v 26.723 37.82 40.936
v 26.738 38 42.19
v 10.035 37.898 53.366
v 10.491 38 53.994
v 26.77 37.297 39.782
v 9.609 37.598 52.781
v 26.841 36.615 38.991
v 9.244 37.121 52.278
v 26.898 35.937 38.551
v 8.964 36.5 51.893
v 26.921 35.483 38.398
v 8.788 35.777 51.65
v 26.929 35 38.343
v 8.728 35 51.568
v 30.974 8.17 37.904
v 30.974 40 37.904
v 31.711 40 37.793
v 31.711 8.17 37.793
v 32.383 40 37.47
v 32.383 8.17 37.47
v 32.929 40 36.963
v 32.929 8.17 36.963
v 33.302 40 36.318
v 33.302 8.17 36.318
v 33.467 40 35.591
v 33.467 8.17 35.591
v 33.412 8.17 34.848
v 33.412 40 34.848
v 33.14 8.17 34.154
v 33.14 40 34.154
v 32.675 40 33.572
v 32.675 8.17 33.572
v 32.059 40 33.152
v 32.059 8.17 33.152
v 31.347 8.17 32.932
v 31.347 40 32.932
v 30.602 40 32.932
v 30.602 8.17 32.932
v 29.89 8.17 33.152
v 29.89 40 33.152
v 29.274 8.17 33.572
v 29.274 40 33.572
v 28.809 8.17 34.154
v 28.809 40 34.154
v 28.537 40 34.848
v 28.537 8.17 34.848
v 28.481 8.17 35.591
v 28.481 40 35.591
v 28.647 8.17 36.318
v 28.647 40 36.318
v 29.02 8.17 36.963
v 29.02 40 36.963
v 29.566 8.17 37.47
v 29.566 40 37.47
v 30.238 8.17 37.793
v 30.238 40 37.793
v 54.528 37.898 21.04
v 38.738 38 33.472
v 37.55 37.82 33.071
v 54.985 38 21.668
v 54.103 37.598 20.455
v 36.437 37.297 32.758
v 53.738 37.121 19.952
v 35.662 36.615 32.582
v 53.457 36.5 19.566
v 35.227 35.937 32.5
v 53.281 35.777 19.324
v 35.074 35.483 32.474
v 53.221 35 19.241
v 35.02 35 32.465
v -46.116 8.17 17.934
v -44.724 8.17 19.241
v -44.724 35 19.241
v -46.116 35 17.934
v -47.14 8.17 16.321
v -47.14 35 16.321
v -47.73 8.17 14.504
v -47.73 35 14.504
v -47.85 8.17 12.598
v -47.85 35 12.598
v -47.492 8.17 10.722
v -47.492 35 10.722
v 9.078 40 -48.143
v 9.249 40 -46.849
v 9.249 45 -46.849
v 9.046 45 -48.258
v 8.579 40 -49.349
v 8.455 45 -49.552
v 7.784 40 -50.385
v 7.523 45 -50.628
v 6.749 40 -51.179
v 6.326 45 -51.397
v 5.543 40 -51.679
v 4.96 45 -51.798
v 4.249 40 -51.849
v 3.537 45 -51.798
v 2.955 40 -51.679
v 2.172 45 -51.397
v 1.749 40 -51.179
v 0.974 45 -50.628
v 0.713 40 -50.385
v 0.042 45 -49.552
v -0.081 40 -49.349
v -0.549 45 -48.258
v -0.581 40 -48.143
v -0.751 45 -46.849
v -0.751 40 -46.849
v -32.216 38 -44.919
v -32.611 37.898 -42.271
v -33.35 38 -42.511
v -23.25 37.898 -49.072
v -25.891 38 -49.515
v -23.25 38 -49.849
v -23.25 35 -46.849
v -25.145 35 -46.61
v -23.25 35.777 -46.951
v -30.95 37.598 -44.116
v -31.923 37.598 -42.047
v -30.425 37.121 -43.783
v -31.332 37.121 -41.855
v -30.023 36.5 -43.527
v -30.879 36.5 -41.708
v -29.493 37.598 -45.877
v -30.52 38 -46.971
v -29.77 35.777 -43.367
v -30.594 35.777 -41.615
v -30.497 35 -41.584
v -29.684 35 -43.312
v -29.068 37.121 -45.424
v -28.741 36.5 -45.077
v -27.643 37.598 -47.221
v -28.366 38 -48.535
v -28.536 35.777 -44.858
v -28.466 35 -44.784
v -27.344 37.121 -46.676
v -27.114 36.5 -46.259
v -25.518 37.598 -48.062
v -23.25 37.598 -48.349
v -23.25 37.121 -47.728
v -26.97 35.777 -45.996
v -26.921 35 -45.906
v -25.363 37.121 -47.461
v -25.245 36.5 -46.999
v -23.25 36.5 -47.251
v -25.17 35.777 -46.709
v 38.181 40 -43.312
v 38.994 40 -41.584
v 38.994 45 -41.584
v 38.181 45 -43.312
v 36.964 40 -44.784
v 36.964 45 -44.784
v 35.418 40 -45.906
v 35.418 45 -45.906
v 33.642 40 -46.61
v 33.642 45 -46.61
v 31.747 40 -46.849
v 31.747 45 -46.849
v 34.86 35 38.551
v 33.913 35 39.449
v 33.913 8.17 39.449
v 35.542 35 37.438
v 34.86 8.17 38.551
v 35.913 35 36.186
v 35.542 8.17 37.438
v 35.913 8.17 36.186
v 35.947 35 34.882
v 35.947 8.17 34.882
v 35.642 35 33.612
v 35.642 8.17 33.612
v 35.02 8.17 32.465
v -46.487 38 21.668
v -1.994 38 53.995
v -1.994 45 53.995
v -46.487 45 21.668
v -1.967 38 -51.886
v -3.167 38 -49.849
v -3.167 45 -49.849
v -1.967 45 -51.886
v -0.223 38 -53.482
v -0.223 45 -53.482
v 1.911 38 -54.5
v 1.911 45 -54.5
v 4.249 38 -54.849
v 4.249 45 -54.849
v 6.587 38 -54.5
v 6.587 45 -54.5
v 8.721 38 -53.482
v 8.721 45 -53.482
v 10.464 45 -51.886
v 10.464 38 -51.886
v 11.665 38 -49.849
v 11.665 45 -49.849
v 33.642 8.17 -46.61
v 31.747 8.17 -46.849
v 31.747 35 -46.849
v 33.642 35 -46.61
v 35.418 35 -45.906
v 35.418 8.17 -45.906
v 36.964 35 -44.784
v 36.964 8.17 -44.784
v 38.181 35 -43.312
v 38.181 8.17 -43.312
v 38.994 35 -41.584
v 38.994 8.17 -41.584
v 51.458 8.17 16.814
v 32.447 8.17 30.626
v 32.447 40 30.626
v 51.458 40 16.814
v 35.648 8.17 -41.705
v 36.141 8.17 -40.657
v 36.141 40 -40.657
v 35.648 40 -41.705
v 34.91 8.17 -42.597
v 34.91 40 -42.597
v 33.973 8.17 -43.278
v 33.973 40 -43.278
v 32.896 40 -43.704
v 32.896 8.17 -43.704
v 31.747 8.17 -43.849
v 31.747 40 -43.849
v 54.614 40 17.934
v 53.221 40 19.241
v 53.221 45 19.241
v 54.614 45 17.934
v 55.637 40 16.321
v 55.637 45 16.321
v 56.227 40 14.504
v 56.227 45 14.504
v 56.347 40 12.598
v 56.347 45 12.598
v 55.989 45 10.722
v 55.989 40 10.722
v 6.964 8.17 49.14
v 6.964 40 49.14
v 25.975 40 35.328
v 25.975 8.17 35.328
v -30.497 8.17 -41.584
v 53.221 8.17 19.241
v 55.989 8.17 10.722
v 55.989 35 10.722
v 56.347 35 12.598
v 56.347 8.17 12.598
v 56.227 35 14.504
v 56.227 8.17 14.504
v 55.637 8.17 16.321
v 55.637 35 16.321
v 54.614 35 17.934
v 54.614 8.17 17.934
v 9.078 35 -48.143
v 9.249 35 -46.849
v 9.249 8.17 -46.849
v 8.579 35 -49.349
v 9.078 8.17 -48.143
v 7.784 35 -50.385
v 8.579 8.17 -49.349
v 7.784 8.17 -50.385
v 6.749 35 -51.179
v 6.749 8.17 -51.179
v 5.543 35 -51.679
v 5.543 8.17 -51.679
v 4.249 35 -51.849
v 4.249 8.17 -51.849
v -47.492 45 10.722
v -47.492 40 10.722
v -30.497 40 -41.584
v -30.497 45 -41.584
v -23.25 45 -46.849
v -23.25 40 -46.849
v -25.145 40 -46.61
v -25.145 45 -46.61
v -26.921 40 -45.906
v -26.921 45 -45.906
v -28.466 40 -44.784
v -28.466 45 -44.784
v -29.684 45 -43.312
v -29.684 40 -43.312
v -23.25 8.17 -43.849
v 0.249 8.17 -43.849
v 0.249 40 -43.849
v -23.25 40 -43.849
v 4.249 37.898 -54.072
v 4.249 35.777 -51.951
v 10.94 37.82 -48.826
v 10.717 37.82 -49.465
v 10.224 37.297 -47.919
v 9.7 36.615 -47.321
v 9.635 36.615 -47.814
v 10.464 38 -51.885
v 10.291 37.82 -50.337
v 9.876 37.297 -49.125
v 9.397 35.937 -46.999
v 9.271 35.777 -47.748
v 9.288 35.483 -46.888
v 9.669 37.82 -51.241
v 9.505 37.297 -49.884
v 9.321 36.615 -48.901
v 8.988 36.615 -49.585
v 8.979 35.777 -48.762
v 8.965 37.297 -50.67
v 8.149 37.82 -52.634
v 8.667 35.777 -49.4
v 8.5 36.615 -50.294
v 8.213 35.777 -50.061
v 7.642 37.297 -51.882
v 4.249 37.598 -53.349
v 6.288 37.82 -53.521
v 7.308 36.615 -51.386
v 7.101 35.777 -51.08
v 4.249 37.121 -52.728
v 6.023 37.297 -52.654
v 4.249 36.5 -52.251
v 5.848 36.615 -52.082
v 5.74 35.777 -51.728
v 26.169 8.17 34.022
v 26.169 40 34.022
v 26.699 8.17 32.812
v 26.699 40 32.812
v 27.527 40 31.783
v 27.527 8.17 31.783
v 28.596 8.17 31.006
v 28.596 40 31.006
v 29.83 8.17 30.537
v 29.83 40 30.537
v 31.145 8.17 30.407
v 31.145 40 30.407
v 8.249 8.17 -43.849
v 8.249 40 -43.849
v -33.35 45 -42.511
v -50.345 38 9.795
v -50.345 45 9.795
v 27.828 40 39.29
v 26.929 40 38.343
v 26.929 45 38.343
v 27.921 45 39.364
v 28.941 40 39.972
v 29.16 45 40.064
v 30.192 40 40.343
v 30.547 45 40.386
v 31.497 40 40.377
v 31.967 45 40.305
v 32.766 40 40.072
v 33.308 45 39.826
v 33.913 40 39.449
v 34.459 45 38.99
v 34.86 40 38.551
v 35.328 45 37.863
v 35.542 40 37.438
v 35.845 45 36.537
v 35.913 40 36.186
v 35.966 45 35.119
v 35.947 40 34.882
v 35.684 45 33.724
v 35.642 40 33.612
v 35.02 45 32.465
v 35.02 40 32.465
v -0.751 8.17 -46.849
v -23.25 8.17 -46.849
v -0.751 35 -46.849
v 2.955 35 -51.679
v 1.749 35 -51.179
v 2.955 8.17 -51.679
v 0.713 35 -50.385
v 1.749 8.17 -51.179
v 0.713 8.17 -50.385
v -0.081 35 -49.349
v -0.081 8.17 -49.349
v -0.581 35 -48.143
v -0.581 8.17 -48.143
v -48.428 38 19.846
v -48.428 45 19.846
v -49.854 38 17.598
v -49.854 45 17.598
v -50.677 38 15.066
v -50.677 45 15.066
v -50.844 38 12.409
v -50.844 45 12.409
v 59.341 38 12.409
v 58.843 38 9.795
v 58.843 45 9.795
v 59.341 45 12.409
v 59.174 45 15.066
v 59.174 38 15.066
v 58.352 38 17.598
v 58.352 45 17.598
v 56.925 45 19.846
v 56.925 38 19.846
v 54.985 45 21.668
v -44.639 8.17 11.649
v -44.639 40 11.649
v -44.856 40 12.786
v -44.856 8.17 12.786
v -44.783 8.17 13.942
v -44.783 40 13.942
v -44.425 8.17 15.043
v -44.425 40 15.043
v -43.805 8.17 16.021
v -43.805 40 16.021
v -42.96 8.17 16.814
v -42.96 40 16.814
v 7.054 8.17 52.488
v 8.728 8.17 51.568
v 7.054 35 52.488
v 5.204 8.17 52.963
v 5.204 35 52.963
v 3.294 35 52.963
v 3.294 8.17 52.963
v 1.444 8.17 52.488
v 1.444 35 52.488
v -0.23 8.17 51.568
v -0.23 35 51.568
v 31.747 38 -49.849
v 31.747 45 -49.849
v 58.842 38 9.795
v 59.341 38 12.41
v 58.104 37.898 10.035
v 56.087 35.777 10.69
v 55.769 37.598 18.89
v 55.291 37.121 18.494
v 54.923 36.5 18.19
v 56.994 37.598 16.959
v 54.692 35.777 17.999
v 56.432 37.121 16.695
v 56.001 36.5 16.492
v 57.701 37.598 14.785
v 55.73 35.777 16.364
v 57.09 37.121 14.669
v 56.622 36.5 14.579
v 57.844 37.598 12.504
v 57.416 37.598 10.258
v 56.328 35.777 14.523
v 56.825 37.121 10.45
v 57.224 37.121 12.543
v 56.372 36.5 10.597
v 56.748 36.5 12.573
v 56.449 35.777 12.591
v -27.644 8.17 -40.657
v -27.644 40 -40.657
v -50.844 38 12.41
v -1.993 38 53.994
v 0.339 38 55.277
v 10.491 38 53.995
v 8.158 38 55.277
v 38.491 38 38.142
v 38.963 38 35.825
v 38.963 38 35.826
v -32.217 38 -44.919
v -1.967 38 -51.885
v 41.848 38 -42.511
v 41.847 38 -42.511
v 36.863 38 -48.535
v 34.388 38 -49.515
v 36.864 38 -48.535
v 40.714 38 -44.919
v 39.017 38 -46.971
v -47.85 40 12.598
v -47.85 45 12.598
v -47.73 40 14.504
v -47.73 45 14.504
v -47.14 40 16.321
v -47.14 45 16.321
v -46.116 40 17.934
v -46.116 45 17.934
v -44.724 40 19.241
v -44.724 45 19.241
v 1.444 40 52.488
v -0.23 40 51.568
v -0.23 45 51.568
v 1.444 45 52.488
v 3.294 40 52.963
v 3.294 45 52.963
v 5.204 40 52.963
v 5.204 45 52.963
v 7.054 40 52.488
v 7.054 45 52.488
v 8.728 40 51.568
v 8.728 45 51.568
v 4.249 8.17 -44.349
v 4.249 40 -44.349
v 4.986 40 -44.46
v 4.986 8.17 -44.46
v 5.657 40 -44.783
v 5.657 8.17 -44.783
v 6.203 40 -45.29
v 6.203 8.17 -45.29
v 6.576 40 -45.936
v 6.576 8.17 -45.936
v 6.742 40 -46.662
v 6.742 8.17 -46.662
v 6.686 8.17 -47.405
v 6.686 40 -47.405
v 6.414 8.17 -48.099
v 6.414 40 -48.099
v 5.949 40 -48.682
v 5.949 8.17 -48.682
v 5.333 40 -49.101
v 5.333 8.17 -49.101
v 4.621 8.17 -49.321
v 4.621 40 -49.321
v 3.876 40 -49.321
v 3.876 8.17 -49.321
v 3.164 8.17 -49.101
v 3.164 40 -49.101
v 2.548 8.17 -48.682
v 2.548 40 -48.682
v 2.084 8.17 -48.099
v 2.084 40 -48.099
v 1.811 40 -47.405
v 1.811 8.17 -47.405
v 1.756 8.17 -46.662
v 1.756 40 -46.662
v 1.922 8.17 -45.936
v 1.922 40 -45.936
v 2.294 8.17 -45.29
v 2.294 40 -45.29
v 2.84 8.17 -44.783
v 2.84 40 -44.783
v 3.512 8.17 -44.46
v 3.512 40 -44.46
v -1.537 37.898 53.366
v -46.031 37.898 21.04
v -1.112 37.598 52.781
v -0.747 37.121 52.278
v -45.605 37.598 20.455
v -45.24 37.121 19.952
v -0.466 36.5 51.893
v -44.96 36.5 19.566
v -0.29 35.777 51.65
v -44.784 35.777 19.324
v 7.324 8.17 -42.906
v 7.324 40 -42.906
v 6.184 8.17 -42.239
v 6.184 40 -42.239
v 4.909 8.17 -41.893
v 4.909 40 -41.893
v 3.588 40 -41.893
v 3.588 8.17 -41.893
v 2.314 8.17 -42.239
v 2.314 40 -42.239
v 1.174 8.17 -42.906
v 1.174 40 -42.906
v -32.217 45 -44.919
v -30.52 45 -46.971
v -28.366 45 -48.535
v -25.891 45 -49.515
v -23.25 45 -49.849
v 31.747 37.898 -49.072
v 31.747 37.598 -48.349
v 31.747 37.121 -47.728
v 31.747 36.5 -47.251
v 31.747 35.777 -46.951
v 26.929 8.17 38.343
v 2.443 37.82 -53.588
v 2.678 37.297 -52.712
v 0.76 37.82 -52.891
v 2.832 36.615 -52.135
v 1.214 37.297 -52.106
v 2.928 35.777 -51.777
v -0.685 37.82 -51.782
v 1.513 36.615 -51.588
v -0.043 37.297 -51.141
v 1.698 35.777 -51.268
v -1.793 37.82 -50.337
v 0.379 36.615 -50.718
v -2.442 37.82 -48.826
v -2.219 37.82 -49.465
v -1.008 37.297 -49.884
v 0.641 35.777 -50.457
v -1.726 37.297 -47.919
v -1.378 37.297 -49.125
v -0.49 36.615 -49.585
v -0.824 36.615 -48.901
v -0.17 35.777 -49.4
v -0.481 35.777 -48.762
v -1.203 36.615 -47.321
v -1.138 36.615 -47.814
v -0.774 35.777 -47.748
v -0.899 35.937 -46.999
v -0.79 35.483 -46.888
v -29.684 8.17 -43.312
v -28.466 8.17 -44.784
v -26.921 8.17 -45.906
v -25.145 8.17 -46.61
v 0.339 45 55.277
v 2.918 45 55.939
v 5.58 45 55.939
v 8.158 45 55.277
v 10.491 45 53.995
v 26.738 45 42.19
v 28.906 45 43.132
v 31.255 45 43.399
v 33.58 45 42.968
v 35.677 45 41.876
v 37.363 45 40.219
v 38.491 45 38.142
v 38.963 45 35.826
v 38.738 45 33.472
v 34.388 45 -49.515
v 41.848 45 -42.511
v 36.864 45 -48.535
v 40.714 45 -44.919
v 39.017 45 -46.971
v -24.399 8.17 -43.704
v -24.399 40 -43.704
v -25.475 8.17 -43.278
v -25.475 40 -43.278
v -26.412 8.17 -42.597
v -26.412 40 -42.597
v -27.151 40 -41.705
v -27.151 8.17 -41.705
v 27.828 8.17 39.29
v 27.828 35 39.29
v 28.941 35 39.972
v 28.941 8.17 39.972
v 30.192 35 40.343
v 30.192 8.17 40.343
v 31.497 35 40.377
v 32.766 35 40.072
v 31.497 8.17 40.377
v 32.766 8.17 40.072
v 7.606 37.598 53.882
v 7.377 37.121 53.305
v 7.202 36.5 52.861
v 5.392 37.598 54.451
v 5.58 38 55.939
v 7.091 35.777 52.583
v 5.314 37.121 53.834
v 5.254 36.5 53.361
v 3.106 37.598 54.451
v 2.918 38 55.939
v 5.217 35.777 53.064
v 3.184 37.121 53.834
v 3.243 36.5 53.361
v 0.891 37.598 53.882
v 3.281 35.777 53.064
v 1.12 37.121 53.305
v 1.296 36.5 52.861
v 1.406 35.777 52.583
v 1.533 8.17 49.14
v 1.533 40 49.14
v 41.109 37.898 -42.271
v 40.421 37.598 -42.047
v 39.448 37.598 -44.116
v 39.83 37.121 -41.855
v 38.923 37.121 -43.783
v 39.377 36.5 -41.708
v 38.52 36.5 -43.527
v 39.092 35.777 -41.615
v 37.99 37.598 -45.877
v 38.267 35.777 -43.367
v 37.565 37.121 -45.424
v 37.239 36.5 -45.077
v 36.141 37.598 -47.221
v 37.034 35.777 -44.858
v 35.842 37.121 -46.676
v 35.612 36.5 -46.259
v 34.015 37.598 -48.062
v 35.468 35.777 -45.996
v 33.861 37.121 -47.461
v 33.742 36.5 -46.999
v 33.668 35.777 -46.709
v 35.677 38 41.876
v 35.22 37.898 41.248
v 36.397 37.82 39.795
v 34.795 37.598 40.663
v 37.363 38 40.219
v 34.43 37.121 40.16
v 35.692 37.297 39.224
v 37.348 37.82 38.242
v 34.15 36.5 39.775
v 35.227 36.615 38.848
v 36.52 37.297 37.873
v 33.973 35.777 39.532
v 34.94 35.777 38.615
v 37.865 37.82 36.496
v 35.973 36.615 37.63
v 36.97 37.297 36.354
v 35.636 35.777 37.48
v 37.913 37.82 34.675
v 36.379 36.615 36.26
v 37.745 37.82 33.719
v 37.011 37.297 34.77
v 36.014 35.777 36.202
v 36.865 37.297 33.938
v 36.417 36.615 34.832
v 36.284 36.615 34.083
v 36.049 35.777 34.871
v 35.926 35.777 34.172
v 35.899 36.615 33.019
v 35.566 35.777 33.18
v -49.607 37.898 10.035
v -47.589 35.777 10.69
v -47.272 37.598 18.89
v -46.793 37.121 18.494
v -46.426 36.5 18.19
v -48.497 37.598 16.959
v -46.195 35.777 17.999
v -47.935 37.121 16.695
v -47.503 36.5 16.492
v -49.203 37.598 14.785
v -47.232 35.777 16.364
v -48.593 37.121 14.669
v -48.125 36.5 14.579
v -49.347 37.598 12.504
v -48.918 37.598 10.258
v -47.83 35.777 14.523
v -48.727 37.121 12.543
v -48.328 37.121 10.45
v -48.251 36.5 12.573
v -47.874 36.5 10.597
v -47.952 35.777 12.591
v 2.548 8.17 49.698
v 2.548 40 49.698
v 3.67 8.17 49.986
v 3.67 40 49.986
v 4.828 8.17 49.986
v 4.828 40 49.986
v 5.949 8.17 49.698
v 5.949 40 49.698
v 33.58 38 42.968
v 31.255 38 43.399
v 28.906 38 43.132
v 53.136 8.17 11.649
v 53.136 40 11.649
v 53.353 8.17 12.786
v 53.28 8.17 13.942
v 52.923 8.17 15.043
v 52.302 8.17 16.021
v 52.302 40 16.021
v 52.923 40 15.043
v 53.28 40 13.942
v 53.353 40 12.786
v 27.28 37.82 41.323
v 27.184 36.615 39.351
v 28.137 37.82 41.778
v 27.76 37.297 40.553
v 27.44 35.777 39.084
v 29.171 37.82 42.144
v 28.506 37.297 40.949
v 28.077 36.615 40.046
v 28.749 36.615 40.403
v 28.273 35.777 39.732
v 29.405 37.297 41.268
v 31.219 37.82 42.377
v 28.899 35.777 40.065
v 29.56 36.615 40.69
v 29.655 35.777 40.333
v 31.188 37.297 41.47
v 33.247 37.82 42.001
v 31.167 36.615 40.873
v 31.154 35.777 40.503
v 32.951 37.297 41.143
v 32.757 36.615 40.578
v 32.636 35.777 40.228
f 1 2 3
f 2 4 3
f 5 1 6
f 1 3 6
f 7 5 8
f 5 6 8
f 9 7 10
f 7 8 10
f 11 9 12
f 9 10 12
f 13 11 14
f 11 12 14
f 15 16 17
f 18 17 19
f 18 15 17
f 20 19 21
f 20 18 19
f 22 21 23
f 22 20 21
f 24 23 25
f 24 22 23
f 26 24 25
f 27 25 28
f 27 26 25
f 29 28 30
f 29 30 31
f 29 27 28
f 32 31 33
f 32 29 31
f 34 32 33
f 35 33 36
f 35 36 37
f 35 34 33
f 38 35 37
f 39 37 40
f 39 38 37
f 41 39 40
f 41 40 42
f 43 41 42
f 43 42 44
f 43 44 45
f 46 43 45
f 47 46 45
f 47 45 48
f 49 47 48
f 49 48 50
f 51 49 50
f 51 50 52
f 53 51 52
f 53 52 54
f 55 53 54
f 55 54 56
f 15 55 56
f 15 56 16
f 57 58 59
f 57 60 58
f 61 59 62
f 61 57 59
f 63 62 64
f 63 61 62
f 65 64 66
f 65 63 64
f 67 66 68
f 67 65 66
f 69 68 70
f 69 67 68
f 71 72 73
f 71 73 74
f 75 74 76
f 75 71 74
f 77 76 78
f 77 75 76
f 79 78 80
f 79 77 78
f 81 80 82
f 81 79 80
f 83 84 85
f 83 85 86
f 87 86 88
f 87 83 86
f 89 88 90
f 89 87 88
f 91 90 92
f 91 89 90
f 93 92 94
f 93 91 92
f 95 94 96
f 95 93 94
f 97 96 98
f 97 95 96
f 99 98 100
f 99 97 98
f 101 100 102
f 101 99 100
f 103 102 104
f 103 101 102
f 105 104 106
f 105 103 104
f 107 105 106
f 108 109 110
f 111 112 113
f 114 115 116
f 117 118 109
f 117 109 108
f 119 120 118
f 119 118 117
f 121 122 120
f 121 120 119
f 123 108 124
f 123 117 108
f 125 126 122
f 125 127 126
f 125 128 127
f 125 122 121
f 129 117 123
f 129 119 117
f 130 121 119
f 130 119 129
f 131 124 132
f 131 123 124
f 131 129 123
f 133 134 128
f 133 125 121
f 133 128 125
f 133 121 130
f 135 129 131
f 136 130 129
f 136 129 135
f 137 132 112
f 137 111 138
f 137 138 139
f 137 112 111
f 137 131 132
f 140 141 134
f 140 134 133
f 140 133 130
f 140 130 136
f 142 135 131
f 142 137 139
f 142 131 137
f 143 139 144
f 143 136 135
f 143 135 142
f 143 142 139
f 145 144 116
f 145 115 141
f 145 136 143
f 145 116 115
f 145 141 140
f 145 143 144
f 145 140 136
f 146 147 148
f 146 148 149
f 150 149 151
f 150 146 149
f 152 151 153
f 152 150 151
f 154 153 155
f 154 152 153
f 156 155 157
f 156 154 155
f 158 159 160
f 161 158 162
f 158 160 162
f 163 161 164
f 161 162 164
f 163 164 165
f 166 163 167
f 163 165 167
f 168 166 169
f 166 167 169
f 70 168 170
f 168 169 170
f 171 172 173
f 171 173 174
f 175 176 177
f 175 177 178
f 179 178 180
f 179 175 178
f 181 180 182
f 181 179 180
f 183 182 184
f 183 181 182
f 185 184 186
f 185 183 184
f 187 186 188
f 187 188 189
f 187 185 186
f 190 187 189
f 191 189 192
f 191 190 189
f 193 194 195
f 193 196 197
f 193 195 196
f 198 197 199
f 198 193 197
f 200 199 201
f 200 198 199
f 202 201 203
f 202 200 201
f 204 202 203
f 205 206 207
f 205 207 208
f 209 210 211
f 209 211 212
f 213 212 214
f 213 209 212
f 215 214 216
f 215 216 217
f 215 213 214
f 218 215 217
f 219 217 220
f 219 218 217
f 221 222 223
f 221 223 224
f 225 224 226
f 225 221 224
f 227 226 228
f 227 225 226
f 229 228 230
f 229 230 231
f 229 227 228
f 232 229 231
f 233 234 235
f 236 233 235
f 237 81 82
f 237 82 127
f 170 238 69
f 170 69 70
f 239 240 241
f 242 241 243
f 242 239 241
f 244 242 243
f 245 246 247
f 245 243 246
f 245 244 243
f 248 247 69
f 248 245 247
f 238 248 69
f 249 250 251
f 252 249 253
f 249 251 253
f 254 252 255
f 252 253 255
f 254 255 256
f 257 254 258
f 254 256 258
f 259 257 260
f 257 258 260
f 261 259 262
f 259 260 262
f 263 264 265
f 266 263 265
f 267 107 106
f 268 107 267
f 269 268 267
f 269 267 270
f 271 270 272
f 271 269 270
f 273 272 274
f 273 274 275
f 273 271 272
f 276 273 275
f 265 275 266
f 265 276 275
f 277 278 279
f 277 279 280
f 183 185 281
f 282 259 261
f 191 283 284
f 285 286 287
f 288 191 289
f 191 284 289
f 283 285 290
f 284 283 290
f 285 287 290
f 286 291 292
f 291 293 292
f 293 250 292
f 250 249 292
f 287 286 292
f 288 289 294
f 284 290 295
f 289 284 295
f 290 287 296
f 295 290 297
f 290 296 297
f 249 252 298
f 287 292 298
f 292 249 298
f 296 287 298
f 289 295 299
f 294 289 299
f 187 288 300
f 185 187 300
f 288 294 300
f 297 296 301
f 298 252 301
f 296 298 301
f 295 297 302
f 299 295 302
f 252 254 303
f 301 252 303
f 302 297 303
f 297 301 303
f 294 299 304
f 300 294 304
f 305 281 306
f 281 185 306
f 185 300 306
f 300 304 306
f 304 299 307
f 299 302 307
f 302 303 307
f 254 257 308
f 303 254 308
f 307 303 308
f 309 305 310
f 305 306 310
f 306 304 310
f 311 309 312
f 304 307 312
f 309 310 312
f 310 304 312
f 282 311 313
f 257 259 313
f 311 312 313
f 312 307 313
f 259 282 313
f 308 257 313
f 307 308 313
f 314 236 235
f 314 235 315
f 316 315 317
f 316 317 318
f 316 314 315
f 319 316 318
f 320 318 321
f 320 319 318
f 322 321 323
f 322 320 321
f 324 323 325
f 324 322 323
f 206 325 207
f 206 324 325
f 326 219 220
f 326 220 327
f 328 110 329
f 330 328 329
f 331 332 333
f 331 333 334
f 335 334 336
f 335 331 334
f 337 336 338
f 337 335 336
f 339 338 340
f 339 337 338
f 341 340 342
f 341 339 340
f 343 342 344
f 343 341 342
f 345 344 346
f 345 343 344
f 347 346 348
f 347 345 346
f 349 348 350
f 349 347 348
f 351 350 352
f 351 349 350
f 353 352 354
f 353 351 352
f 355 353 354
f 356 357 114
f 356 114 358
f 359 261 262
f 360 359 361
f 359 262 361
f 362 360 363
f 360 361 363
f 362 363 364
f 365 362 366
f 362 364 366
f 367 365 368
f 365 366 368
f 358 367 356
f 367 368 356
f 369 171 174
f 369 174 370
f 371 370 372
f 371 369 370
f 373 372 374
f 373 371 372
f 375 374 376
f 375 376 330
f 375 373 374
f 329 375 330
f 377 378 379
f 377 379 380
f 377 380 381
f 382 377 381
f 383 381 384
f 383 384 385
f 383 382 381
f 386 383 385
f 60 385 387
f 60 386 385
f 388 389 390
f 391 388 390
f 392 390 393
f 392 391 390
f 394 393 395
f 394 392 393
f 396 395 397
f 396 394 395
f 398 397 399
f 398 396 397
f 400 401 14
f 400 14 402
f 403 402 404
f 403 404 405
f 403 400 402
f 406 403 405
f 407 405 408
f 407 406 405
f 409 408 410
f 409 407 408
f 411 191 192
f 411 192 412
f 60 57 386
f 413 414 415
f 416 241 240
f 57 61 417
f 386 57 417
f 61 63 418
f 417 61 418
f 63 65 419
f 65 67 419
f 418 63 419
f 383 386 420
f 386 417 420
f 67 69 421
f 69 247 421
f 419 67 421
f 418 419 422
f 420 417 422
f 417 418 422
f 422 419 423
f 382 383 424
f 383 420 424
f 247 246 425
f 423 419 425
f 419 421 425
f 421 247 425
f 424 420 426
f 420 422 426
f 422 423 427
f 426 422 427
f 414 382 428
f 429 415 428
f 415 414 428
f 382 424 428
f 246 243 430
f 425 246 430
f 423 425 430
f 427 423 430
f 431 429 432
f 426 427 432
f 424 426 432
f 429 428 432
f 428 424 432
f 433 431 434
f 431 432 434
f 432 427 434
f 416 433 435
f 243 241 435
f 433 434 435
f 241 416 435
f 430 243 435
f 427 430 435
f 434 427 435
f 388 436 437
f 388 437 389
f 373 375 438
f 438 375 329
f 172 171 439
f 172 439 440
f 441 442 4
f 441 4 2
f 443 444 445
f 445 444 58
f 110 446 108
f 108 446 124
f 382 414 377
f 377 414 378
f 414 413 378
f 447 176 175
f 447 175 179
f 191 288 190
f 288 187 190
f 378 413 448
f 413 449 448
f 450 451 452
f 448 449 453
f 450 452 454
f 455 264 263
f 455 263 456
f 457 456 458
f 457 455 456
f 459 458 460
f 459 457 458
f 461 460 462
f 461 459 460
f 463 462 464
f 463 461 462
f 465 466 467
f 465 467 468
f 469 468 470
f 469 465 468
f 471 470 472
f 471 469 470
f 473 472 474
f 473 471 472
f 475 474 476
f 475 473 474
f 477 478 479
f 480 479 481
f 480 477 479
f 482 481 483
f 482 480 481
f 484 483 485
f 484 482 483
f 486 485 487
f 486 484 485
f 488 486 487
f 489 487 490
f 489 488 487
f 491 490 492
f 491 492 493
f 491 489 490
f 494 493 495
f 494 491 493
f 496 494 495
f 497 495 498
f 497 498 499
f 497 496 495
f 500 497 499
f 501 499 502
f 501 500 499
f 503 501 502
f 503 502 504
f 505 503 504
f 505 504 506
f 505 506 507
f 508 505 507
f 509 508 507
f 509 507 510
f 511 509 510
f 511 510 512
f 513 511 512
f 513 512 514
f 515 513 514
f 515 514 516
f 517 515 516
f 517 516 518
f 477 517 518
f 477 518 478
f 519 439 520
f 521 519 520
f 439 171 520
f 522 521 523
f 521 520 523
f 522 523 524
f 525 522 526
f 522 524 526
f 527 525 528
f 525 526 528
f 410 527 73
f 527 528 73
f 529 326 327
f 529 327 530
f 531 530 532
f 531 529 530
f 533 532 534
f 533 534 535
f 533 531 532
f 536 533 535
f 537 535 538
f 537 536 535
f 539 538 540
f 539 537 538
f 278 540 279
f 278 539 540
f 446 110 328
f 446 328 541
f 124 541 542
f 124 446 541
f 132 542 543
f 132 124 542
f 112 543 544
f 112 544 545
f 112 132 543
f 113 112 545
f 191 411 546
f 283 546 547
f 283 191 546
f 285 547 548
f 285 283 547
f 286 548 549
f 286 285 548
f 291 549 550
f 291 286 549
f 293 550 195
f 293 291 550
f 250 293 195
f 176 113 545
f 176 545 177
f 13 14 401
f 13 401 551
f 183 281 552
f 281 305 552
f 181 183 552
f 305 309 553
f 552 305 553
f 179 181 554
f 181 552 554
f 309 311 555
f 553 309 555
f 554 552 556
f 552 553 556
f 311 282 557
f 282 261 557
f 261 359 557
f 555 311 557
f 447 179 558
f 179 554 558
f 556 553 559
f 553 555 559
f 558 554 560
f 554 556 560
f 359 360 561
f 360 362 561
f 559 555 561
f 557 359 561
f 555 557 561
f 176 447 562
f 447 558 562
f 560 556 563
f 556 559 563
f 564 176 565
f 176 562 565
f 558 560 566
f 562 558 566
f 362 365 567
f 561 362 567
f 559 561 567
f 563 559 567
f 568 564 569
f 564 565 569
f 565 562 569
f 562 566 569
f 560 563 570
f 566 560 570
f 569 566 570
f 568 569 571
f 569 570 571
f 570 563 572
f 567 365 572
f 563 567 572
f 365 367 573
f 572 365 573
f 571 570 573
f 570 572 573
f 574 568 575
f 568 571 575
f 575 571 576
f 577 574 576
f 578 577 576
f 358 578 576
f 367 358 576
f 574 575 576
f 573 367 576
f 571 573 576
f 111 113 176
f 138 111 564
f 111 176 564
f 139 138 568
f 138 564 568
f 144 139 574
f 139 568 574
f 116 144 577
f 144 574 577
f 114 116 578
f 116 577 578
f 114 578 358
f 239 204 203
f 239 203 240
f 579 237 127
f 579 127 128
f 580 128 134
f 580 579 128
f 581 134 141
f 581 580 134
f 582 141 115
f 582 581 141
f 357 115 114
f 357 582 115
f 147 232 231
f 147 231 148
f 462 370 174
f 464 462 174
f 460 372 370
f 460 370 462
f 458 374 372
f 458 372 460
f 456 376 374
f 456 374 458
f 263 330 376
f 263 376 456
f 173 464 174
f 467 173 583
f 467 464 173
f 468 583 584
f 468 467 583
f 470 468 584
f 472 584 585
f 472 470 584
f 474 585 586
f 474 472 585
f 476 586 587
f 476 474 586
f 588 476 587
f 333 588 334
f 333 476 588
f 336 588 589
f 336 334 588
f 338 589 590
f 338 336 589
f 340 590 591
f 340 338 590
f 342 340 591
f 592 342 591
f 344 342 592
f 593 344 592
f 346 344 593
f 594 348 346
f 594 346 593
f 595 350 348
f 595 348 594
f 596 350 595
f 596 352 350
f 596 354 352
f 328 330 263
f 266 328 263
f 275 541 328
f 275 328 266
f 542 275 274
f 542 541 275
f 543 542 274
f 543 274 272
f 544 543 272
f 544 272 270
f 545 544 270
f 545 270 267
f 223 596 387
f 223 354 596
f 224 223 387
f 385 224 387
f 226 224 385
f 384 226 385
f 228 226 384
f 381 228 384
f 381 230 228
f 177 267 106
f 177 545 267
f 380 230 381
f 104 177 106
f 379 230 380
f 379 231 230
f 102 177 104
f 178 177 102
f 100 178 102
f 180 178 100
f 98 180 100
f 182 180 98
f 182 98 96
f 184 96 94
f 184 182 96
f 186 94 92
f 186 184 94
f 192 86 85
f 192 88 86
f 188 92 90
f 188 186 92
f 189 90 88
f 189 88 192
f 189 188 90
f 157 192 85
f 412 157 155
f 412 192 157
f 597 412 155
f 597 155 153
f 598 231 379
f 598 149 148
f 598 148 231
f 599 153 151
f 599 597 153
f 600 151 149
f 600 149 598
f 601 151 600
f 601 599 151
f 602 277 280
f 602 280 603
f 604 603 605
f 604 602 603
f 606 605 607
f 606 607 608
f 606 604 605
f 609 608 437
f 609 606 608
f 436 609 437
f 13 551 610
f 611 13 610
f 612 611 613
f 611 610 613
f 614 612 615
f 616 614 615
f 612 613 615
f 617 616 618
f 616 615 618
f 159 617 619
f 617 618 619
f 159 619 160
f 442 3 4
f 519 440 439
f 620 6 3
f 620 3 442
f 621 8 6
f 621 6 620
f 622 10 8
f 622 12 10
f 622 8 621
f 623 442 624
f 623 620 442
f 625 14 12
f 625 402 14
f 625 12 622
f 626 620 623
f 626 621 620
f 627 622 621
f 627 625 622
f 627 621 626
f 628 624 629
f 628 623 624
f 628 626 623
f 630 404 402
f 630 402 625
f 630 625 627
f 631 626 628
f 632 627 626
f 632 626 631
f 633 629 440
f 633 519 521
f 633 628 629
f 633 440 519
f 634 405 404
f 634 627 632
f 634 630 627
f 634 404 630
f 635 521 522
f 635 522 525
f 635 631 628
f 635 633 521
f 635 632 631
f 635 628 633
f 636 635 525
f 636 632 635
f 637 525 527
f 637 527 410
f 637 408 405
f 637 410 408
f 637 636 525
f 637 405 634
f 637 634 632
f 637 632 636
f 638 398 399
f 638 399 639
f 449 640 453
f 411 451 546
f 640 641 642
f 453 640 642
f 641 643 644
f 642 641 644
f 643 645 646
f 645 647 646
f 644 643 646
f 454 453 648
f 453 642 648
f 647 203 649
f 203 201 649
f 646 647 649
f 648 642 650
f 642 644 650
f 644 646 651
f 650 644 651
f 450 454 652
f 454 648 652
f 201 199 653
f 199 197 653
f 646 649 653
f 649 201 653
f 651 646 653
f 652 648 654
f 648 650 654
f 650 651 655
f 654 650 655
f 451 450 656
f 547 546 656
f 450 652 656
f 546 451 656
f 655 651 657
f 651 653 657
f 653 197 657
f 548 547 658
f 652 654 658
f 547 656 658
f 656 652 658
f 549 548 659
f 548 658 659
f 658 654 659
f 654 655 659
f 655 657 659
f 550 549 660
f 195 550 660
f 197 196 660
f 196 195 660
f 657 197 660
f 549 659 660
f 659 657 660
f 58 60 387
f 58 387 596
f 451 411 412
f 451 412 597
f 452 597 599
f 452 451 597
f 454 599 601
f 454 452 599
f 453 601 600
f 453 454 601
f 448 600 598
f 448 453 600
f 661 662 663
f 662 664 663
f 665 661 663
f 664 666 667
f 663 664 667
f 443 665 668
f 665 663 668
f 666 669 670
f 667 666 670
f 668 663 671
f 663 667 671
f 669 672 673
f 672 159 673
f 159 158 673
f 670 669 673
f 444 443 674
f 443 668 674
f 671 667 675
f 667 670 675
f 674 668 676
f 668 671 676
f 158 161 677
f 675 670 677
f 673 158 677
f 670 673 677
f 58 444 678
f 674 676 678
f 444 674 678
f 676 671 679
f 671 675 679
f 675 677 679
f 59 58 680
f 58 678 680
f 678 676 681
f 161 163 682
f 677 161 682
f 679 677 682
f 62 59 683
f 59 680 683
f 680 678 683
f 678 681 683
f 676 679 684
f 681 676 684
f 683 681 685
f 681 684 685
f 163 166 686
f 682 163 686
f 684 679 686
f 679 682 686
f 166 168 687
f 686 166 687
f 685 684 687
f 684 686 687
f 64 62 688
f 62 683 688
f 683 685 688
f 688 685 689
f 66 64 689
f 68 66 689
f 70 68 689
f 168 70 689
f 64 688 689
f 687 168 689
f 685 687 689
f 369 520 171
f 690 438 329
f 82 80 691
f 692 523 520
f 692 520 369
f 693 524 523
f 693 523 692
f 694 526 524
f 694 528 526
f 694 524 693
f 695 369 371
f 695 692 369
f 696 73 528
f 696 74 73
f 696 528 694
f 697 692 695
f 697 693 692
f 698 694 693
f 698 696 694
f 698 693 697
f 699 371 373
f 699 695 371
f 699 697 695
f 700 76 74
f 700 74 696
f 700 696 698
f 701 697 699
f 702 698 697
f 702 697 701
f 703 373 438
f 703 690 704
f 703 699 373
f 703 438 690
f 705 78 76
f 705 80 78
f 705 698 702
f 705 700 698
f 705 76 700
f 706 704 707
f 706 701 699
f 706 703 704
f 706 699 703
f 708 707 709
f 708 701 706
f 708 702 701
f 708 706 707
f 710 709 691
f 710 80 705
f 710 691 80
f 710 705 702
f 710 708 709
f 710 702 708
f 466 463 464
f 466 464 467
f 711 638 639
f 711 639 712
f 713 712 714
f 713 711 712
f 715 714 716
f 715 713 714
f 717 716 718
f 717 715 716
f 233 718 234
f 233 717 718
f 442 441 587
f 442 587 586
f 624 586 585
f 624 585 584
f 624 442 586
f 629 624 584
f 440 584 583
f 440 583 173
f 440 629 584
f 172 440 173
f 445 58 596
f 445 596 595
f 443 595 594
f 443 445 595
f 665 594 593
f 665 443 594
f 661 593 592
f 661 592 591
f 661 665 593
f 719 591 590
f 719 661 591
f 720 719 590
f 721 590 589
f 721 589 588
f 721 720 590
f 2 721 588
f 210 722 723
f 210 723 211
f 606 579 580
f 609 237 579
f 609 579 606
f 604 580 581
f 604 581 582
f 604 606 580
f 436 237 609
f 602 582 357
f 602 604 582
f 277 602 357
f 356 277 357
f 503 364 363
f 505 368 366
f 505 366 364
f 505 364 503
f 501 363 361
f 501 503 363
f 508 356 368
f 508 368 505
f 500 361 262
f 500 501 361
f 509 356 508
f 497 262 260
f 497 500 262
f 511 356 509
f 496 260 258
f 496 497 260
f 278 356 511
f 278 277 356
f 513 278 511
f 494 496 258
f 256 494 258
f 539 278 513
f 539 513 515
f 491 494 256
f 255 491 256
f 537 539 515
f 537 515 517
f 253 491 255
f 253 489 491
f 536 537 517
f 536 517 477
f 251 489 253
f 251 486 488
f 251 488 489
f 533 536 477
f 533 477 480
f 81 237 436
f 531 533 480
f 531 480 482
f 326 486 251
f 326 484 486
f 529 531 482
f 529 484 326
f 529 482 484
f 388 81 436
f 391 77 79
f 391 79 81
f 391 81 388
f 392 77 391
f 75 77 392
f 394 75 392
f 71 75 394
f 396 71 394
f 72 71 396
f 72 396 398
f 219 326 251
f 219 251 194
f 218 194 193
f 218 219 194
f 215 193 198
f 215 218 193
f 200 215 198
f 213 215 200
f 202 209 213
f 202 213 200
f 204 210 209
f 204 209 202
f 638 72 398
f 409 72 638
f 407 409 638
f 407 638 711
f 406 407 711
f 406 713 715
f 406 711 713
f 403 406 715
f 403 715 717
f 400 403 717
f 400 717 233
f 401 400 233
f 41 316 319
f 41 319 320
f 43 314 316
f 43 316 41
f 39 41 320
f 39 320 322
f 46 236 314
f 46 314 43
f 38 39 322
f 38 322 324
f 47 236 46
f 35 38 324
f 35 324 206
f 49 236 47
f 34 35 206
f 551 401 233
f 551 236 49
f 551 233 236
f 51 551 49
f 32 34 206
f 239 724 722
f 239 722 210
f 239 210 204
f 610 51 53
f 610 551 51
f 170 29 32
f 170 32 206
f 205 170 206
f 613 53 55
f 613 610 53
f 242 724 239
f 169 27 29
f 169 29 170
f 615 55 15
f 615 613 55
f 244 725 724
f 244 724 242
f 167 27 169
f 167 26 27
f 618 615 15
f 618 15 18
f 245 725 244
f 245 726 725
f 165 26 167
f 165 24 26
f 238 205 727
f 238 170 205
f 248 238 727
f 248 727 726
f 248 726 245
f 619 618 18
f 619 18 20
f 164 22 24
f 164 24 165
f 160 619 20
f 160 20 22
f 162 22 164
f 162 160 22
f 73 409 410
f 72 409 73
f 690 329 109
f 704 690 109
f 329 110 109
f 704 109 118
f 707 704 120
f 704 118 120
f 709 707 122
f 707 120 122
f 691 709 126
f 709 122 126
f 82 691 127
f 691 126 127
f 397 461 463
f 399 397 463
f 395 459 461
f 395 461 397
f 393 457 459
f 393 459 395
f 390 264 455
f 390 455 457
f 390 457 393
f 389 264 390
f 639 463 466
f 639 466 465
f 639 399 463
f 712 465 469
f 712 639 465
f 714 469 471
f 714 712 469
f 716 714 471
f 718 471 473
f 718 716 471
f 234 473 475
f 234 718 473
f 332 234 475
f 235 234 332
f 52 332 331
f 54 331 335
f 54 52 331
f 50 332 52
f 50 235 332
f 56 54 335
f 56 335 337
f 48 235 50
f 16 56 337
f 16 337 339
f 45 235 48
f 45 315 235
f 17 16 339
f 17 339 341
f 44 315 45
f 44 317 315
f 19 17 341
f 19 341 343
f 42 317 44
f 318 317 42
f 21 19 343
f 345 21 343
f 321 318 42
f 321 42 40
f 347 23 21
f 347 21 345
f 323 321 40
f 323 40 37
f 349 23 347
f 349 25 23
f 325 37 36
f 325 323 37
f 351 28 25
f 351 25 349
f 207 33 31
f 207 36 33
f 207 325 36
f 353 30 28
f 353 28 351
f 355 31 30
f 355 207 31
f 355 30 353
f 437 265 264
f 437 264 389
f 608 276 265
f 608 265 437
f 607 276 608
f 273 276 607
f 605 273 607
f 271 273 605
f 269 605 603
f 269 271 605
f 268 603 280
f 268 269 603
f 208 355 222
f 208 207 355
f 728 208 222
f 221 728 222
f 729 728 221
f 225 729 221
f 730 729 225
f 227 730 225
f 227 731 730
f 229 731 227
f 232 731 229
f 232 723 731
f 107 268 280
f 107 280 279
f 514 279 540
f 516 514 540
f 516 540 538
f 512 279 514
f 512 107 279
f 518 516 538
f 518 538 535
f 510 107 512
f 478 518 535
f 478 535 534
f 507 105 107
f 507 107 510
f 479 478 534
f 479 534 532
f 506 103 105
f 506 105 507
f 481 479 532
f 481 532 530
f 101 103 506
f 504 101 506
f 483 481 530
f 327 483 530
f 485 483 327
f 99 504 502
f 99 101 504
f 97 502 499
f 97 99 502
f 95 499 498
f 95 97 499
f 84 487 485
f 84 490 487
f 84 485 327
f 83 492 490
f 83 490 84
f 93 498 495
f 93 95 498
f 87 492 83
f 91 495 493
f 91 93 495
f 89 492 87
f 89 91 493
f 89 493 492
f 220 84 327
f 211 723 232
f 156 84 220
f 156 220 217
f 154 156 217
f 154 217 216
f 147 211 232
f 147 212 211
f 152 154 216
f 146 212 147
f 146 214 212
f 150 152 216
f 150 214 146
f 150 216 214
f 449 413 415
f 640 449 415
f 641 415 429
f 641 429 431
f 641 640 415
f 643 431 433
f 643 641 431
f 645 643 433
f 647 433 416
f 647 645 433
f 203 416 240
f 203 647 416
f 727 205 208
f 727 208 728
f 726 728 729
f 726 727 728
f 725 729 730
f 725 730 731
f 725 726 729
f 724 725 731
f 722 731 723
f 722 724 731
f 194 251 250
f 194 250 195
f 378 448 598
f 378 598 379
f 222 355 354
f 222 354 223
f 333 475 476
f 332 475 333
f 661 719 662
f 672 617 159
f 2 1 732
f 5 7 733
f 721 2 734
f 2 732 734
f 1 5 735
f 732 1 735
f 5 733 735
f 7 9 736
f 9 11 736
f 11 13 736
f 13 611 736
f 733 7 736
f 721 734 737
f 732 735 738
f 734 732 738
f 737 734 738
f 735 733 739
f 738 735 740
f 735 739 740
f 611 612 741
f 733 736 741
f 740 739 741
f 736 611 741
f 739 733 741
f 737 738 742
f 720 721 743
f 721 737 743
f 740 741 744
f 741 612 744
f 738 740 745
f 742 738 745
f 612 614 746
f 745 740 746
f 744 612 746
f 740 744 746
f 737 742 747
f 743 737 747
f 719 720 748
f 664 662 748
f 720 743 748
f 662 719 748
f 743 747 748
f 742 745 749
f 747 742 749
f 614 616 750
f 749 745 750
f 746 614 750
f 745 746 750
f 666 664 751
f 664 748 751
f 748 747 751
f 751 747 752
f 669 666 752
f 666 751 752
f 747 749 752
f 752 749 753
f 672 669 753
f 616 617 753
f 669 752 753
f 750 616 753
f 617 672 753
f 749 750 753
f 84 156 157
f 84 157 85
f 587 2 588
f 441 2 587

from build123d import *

# Parameters (mm, degrees)
SKETCH1_R                = 2.5
BOSS_EXTRUDE1_DEPTH      = 40
BOSS_EXTRUDE2_DEPTH      = 5
BOSS_EXTRUDE2_DEPTH_BACK = 2
FILLET1_R                = 3
BOSS_EXTRUDE3_START      = 7
SKETCH3_R                = 2.5
BOSS_EXTRUDE3_DEPTH      = 7
SKETCH4_R                = 2.5
CUT_EXTRUDE1_DEPTH       = 15.17


with BuildPart() as part:
    # Sketch1 → Boss-Extrude1 (new body)
    # profile 1 of 3: a face of its own
    with BuildSketch(Plane(origin=(0, 0, 0), x_dir=(1, 0, 0), z_dir=(0, 1, 0))):
        with BuildLine():
            Line((55.989380272, -10.721623107), (38.994348201, 41.58370731))
            ThreePointArc((38.994348201, 41.58370731), (36.22622117, 45.39370731), (31.747297547, 46.848997812))
            Line((31.747297547, 46.848997812), (9.248758018, 46.848997812))
            ThreePointArc((9.248758018, 46.848997812), (7.784291924, 50.384531718), (4.248758018, 51.848997812))
            Line((4.248758018, 51.848997812), (4.248758018, 50.848997812))
            ThreePointArc((4.248758018, 50.848997812), (1.420330893, 49.677424937), (0.248758018, 46.848997812))
            Line((0.248758018, 46.848997812), (-23.249781512, 46.848997812))
            ThreePointArc((-23.249781512, 46.848997812), (-27.728705135, 45.39370731), (-30.496832166, 41.58370731))
            Line((-30.496832166, 41.58370731), (-47.491864237, -10.721623107))
            ThreePointArc((-47.491864237, -10.721623107), (-47.491864237, -15.431042101), (-44.723737205, -19.241042101))
            Line((-44.723737205, -19.241042101), (-0.230165605, -51.567514092))
            ThreePointArc((-0.230165605, -51.567514092), (4.248758018, -53.022804594), (8.72768164, -51.567514092))
            Line((8.72768164, -51.567514092), (27.738399463, -37.755419106))
            ThreePointArc((27.738399463, -37.755419106), (30.34872958, -39.355031459), (33.325608449, -38.640346074))
            Line((33.325608449, -38.640346074), (33.913393702, -39.449363068))
            ThreePointArc((33.913393702, -39.449363068), (35.912909143, -36.186450422), (35.019552412, -32.465351835))
            Line((35.019552412, -32.465351835), (53.22125324, -19.241042101))
            ThreePointArc((53.22125324, -19.241042101), (55.989380272, -15.431042101), (55.989380272, -10.721623107))
        make_face()
        with Locations(Location((4.248758018, 46.848997812, 0), (0, 0, 270))):
            Circle(SKETCH1_R, mode=Mode.SUBTRACT)
        with Locations(Location((30.97446744, -35.404278096, 0), (0, 0, 270))):
            Circle(SKETCH1_R, mode=Mode.SUBTRACT)
        with BuildLine():
            ThreePointArc((-23.249781512, 43.848997812), (-25.965349378, 42.966656326), (-27.643662617, 40.656656326))
            Line((-27.643662617, 40.656656326), (-44.638694688, -11.64867409))
            ThreePointArc((-44.638694688, -11.64867409), (-44.638694688, -14.503991118), (-42.960381448, -16.813991118))
            Line((-42.960381448, -16.813991118), (1.533190152, -49.140463108))
            ThreePointArc((1.533190152, -49.140463108), (4.248758018, -50.022804594), (6.964325883, -49.140463108))
            Line((6.964325883, -49.140463108), (25.975043706, -35.328368122))
            ThreePointArc((25.975043706, -35.328368122), (28.035541179, -31.359193125), (32.447179661, -30.626086104))
            Line((32.447179661, -30.626086104), (51.457897483, -16.813991118))
            ThreePointArc((51.457897483, -16.813991118), (53.136210723, -14.503991118), (53.136210723, -11.64867409))
            Line((53.136210723, -11.64867409), (36.141178653, 40.656656326))
            ThreePointArc((36.141178653, 40.656656326), (34.462865413, 42.966656326), (31.747297547, 43.848997812))
            Line((31.747297547, 43.848997812), (8.248758018, 43.848997812))
            ThreePointArc((8.248758018, 43.848997812), (4.248758018, 41.848997812), (0.248758018, 43.848997812))
            Line((0.248758018, 43.848997812), (-23.249781512, 43.848997812))
        make_face(mode=Mode.SUBTRACT)
    # profile 2 of 3: a face of its own
    with BuildSketch(Plane(origin=(0, 0, 0), x_dir=(1, 0, 0), z_dir=(0, 1, 0))):
        with BuildLine():
            ThreePointArc((26.929382468, -38.343204358), (30.192295115, -40.342719799), (33.913393702, -39.449363068))
            Line((33.913393702, -39.449363068), (33.325608449, -38.640346074))
            ThreePointArc((33.325608449, -38.640346074), (30.34872958, -39.355031459), (27.738399463, -37.755419106))
            Line((27.738399463, -37.755419106), (26.929382468, -38.343204358))
        make_face()
    # profile 3 of 3: a face of its own
    with BuildSketch(Plane(origin=(0, 0, 0), x_dir=(1, 0, 0), z_dir=(0, 1, 0))):
        with BuildLine():
            Line((4.248758018, 50.848997812), (4.248758018, 51.848997812))
            ThreePointArc((4.248758018, 51.848997812), (0.713224112, 50.384531718), (-0.751241982, 46.848997812))
            Line((-0.751241982, 46.848997812), (0.248758018, 46.848997812))
            ThreePointArc((0.248758018, 46.848997812), (1.420330893, 49.677424937), (4.248758018, 50.848997812))
        make_face()
    extrude(amount=BOSS_EXTRUDE1_DEPTH)

    # Sketch2 → Boss-Extrude2 (add, two sides: drawn at the far end of the back side and taken through both)
    with BuildSketch(Plane(origin=(0, 40, 0), x_dir=(1, 0, 0), z_dir=(0, 1, 0)).offset(-BOSS_EXTRUDE2_DEPTH_BACK)):
        Polygon((-30.496832166, 41.58370731), (-33.350001715, 42.510758293), (-50.345033785, -9.794572124), (-47.491864237, -10.721623107), align=None)
        with BuildLine():
            Line((-1.993521362, -53.994565075), (-46.487092962, -21.668093084))
            ThreePointArc((-46.487092962, -21.668093084), (-50.345033785, -16.358093084), (-50.345033785, -9.794572124))
            Line((-50.345033785, -9.794572124), (-47.491864237, -10.721623107))
            ThreePointArc((-47.491864237, -10.721623107), (-47.491864237, -15.431042101), (-44.723737205, -19.241042101))
            Line((-44.723737205, -19.241042101), (-0.230165605, -51.567514092))
            ThreePointArc((-0.230165605, -51.567514092), (4.248758018, -53.022804594), (8.72768164, -51.567514092))
            Line((8.72768164, -51.567514092), (26.929382468, -38.343204358))
            ThreePointArc((26.929382468, -38.343204358), (33.913393702, -39.449363068), (35.019552412, -32.465351835))
            Line((35.019552412, -32.465351835), (53.22125324, -19.241042101))
            ThreePointArc((53.22125324, -19.241042101), (55.989380272, -15.431042101), (55.989380272, -10.721623107))
            Line((55.989380272, -10.721623107), (38.994348201, 41.58370731))
            ThreePointArc((38.994348201, 41.58370731), (36.22622117, 45.39370731), (31.747297547, 46.848997812))
            Line((31.747297547, 46.848997812), (9.248758018, 46.848997812))
            ThreePointArc((9.248758018, 46.848997812), (4.248758018, 51.848997812), (-0.751241982, 46.848997812))
            Line((-0.751241982, 46.848997812), (-23.249781512, 46.848997812))
            Line((-23.249781512, 46.848997812), (-23.249781512, 49.848997812))
            Line((-23.249781512, 49.848997812), (-3.16744047, 49.848997812))
            ThreePointArc((-3.16744047, 49.848997812), (4.248758018, 54.848997812), (11.664956505, 49.848997812))
            Line((11.664956505, 49.848997812), (31.747297547, 49.848997812))
            ThreePointArc((31.747297547, 49.848997812), (37.989576927, 47.820758293), (41.84751775, 42.510758293))
            Line((41.84751775, 42.510758293), (58.842549821, -9.794572124))
            ThreePointArc((58.842549821, -9.794572124), (58.842549821, -16.358093084), (54.984608997, -21.668093084))
            Line((54.984608997, -21.668093084), (38.737653807, -33.472196981))
            ThreePointArc((38.737653807, -33.472196981), (35.676749458, -41.876414051), (26.737992587, -42.190461178))
            Line((26.737992587, -42.190461178), (10.491037397, -53.994565075))
            ThreePointArc((10.491037397, -53.994565075), (4.248758018, -56.022804594), (-1.993521362, -53.994565075))
        make_face()
        with BuildLine():
            ThreePointArc((-33.350001715, 42.510758293), (-29.492060891, 47.820758293), (-23.249781512, 49.848997812))
            Line((-23.249781512, 49.848997812), (-23.249781512, 46.848997812))
            ThreePointArc((-23.249781512, 46.848997812), (-27.728705135, 45.39370731), (-30.496832166, 41.58370731))
            Line((-30.496832166, 41.58370731), (-33.350001715, 42.510758293))
        make_face()
    extrude(amount=BOSS_EXTRUDE2_DEPTH + BOSS_EXTRUDE2_DEPTH_BACK)

    # Fillet1
    fillet1_edges = [part.edges().sort_by_distance(p)[0] for p in [
        (-38.994348201, 38, -15.431042101),
        (-47.491864237, 38, 15.431042101),
        (-22.476951405, 38, 35.404278096),
        (4.248758018, 38, 53.022804594),
        (17.828532054, 38, 44.955359225),
        (33.913393702, 38, 39.449363068),
        (44.120402826, 38, 25.853196968),
        (55.989380272, 38, 15.431042101),
        (47.491864237, 38, -15.431042101),
        (36.22622117, 38, -45.39370731),
        (20.498027782, 38, -46.848997812),
        (4.248758018, 38, -51.848997812),
        (-12.000511747, 38, -46.848997812),
        (-27.728705135, 38, -45.39370731),
    ]]
    fillet(fillet1_edges, radius=FILLET1_R - 0.0001)  # a hair under: the kernel refuses the full size

    # Sketch3 → Boss-Extrude3 (add)
    with BuildSketch(Plane.XZ.offset(BOSS_EXTRUDE3_START)):
        with BuildLine():
            Line((38.994348201, -41.58370731), (55.989380272, 10.721623107))
            ThreePointArc((55.989380272, 10.721623107), (55.989380272, 15.431042101), (53.22125324, 19.241042101))
            Line((53.22125324, 19.241042101), (35.019552412, 32.465351835))
            ThreePointArc((35.019552412, 32.465351835), (33.913393702, 39.449363068), (26.929382468, 38.343204358))
            Line((26.929382468, 38.343204358), (8.72768164, 51.567514092))
            ThreePointArc((8.72768164, 51.567514092), (4.248758018, 53.022804594), (-0.230165605, 51.567514092))
            Line((-0.230165605, 51.567514092), (-44.723737205, 19.241042101))
            ThreePointArc((-44.723737205, 19.241042101), (-47.491864237, 15.431042101), (-47.491864237, 10.721623107))
            Line((-47.491864237, 10.721623107), (-30.496832166, -41.58370731))
            ThreePointArc((-30.496832166, -41.58370731), (-27.728705135, -45.39370731), (-23.249781512, -46.848997812))
            Line((-23.249781512, -46.848997812), (-0.751241982, -46.848997812))
            ThreePointArc((-0.751241982, -46.848997812), (4.248758018, -51.848997812), (9.248758018, -46.848997812))
            Line((9.248758018, -46.848997812), (31.747297547, -46.848997812))
            ThreePointArc((31.747297547, -46.848997812), (36.22622117, -45.39370731), (38.994348201, -41.58370731))
        make_face()
        with Locations(Location((30.97446744, 35.404278096, 0), (0, 0, 270))):
            Circle(SKETCH3_R, mode=Mode.SUBTRACT)
        with Locations(Location((4.248758018, -46.848997812, 0), (0, 0, 270))):
            Circle(SKETCH3_R, mode=Mode.SUBTRACT)
        with BuildLine():
            Line((-44.638694688, 11.64867409), (-27.643662617, -40.656656326))
            ThreePointArc((-27.643662617, -40.656656326), (-25.965349378, -42.966656326), (-23.249781512, -43.848997812))
            Line((-23.249781512, -43.848997812), (0.248758018, -43.848997812))
            ThreePointArc((0.248758018, -43.848997812), (4.248758018, -41.848997812), (8.248758018, -43.848997812))
            Line((8.248758018, -43.848997812), (31.747297547, -43.848997812))
            ThreePointArc((31.747297547, -43.848997812), (34.462865413, -42.966656326), (36.141178653, -40.656656326))
            Line((36.141178653, -40.656656326), (53.136210723, 11.64867409))
            ThreePointArc((53.136210723, 11.64867409), (53.136210723, 14.503991118), (51.457897483, 16.813991118))
            Line((51.457897483, 16.813991118), (32.447179661, 30.626086104))
            ThreePointArc((32.447179661, 30.626086104), (28.035541179, 31.359193125), (25.975043706, 35.328368122))
            Line((25.975043706, 35.328368122), (6.964325883, 49.140463108))
            ThreePointArc((6.964325883, 49.140463108), (4.248758018, 50.022804594), (1.533190152, 49.140463108))
            Line((1.533190152, 49.140463108), (-42.960381448, 16.813991118))
            ThreePointArc((-42.960381448, 16.813991118), (-44.638694688, 14.503991118), (-44.638694688, 11.64867409))
        make_face(mode=Mode.SUBTRACT)
    extrude(amount=-BOSS_EXTRUDE3_DEPTH)

    # Sketch4 → Cut-Extrude1 (cut)
    with BuildSketch(Plane.XZ.offset(7)):
        with BuildLine():
            Line((38.994348201, -41.58370731), (55.989380272, 10.721623107))
            ThreePointArc((55.989380272, 10.721623107), (55.989380272, 15.431042101), (53.22125324, 19.241042101))
            Line((53.22125324, 19.241042101), (35.019552412, 32.465351835))
            ThreePointArc((35.019552412, 32.465351835), (33.913393702, 39.449363068), (26.929382468, 38.343204358))
            Line((26.929382468, 38.343204358), (8.72768164, 51.567514092))
            ThreePointArc((8.72768164, 51.567514092), (4.248758018, 53.022804594), (-0.230165605, 51.567514092))
            Line((-0.230165605, 51.567514092), (-44.723737205, 19.241042101))
            ThreePointArc((-44.723737205, 19.241042101), (-47.491864237, 15.431042101), (-47.491864237, 10.721623107))
            Line((-47.491864237, 10.721623107), (-30.496832166, -41.58370731))
            ThreePointArc((-30.496832166, -41.58370731), (-27.728705135, -45.39370731), (-23.249781512, -46.848997812))
            Line((-23.249781512, -46.848997812), (-0.751241982, -46.848997812))
            ThreePointArc((-0.751241982, -46.848997812), (4.248758018, -51.848997812), (9.248758018, -46.848997812))
            Line((9.248758018, -46.848997812), (31.747297547, -46.848997812))
            ThreePointArc((31.747297547, -46.848997812), (36.22622117, -45.39370731), (38.994348201, -41.58370731))
        make_face()
        with Locations(Location((30.97446744, 35.404278096, 0), (0, 0, 270))):
            Circle(SKETCH4_R, mode=Mode.SUBTRACT)
        with Locations(Location((4.248758018, -46.848997812, 0), (0, 0, 270))):
            Circle(SKETCH4_R, mode=Mode.SUBTRACT)
        with BuildLine():
            Line((-23.249781512, -43.848997812), (0.248758018, -43.848997812))
            ThreePointArc((0.248758018, -43.848997812), (4.248758018, -41.848997812), (8.248758018, -43.848997812))
            Line((8.248758018, -43.848997812), (31.747297547, -43.848997812))
            ThreePointArc((31.747297547, -43.848997812), (34.462865413, -42.966656326), (36.141178653, -40.656656326))
            Line((36.141178653, -40.656656326), (53.136210723, 11.64867409))
            ThreePointArc((53.136210723, 11.64867409), (53.136210723, 14.503991118), (51.457897483, 16.813991118))
            Line((51.457897483, 16.813991118), (32.447179661, 30.626086104))
            ThreePointArc((32.447179661, 30.626086104), (28.035541179, 31.359193125), (25.975043706, 35.328368122))
            Line((25.975043706, 35.328368122), (6.964325883, 49.140463108))
            ThreePointArc((6.964325883, 49.140463108), (4.248758018, 50.022804594), (1.533190152, 49.140463108))
            Line((1.533190152, 49.140463108), (-42.960381448, 16.813991118))
            ThreePointArc((-42.960381448, 16.813991118), (-44.638694688, 14.503991118), (-44.638694688, 11.64867409))
            Line((-44.638694688, 11.64867409), (-27.643662617, -40.656656326))
            ThreePointArc((-27.643662617, -40.656656326), (-25.965349378, -42.966656326), (-23.249781512, -43.848997812))
        make_face(mode=Mode.SUBTRACT)
    extrude(amount=-CUT_EXTRUDE1_DEPTH, mode=Mode.SUBTRACT)


solid = part.part
